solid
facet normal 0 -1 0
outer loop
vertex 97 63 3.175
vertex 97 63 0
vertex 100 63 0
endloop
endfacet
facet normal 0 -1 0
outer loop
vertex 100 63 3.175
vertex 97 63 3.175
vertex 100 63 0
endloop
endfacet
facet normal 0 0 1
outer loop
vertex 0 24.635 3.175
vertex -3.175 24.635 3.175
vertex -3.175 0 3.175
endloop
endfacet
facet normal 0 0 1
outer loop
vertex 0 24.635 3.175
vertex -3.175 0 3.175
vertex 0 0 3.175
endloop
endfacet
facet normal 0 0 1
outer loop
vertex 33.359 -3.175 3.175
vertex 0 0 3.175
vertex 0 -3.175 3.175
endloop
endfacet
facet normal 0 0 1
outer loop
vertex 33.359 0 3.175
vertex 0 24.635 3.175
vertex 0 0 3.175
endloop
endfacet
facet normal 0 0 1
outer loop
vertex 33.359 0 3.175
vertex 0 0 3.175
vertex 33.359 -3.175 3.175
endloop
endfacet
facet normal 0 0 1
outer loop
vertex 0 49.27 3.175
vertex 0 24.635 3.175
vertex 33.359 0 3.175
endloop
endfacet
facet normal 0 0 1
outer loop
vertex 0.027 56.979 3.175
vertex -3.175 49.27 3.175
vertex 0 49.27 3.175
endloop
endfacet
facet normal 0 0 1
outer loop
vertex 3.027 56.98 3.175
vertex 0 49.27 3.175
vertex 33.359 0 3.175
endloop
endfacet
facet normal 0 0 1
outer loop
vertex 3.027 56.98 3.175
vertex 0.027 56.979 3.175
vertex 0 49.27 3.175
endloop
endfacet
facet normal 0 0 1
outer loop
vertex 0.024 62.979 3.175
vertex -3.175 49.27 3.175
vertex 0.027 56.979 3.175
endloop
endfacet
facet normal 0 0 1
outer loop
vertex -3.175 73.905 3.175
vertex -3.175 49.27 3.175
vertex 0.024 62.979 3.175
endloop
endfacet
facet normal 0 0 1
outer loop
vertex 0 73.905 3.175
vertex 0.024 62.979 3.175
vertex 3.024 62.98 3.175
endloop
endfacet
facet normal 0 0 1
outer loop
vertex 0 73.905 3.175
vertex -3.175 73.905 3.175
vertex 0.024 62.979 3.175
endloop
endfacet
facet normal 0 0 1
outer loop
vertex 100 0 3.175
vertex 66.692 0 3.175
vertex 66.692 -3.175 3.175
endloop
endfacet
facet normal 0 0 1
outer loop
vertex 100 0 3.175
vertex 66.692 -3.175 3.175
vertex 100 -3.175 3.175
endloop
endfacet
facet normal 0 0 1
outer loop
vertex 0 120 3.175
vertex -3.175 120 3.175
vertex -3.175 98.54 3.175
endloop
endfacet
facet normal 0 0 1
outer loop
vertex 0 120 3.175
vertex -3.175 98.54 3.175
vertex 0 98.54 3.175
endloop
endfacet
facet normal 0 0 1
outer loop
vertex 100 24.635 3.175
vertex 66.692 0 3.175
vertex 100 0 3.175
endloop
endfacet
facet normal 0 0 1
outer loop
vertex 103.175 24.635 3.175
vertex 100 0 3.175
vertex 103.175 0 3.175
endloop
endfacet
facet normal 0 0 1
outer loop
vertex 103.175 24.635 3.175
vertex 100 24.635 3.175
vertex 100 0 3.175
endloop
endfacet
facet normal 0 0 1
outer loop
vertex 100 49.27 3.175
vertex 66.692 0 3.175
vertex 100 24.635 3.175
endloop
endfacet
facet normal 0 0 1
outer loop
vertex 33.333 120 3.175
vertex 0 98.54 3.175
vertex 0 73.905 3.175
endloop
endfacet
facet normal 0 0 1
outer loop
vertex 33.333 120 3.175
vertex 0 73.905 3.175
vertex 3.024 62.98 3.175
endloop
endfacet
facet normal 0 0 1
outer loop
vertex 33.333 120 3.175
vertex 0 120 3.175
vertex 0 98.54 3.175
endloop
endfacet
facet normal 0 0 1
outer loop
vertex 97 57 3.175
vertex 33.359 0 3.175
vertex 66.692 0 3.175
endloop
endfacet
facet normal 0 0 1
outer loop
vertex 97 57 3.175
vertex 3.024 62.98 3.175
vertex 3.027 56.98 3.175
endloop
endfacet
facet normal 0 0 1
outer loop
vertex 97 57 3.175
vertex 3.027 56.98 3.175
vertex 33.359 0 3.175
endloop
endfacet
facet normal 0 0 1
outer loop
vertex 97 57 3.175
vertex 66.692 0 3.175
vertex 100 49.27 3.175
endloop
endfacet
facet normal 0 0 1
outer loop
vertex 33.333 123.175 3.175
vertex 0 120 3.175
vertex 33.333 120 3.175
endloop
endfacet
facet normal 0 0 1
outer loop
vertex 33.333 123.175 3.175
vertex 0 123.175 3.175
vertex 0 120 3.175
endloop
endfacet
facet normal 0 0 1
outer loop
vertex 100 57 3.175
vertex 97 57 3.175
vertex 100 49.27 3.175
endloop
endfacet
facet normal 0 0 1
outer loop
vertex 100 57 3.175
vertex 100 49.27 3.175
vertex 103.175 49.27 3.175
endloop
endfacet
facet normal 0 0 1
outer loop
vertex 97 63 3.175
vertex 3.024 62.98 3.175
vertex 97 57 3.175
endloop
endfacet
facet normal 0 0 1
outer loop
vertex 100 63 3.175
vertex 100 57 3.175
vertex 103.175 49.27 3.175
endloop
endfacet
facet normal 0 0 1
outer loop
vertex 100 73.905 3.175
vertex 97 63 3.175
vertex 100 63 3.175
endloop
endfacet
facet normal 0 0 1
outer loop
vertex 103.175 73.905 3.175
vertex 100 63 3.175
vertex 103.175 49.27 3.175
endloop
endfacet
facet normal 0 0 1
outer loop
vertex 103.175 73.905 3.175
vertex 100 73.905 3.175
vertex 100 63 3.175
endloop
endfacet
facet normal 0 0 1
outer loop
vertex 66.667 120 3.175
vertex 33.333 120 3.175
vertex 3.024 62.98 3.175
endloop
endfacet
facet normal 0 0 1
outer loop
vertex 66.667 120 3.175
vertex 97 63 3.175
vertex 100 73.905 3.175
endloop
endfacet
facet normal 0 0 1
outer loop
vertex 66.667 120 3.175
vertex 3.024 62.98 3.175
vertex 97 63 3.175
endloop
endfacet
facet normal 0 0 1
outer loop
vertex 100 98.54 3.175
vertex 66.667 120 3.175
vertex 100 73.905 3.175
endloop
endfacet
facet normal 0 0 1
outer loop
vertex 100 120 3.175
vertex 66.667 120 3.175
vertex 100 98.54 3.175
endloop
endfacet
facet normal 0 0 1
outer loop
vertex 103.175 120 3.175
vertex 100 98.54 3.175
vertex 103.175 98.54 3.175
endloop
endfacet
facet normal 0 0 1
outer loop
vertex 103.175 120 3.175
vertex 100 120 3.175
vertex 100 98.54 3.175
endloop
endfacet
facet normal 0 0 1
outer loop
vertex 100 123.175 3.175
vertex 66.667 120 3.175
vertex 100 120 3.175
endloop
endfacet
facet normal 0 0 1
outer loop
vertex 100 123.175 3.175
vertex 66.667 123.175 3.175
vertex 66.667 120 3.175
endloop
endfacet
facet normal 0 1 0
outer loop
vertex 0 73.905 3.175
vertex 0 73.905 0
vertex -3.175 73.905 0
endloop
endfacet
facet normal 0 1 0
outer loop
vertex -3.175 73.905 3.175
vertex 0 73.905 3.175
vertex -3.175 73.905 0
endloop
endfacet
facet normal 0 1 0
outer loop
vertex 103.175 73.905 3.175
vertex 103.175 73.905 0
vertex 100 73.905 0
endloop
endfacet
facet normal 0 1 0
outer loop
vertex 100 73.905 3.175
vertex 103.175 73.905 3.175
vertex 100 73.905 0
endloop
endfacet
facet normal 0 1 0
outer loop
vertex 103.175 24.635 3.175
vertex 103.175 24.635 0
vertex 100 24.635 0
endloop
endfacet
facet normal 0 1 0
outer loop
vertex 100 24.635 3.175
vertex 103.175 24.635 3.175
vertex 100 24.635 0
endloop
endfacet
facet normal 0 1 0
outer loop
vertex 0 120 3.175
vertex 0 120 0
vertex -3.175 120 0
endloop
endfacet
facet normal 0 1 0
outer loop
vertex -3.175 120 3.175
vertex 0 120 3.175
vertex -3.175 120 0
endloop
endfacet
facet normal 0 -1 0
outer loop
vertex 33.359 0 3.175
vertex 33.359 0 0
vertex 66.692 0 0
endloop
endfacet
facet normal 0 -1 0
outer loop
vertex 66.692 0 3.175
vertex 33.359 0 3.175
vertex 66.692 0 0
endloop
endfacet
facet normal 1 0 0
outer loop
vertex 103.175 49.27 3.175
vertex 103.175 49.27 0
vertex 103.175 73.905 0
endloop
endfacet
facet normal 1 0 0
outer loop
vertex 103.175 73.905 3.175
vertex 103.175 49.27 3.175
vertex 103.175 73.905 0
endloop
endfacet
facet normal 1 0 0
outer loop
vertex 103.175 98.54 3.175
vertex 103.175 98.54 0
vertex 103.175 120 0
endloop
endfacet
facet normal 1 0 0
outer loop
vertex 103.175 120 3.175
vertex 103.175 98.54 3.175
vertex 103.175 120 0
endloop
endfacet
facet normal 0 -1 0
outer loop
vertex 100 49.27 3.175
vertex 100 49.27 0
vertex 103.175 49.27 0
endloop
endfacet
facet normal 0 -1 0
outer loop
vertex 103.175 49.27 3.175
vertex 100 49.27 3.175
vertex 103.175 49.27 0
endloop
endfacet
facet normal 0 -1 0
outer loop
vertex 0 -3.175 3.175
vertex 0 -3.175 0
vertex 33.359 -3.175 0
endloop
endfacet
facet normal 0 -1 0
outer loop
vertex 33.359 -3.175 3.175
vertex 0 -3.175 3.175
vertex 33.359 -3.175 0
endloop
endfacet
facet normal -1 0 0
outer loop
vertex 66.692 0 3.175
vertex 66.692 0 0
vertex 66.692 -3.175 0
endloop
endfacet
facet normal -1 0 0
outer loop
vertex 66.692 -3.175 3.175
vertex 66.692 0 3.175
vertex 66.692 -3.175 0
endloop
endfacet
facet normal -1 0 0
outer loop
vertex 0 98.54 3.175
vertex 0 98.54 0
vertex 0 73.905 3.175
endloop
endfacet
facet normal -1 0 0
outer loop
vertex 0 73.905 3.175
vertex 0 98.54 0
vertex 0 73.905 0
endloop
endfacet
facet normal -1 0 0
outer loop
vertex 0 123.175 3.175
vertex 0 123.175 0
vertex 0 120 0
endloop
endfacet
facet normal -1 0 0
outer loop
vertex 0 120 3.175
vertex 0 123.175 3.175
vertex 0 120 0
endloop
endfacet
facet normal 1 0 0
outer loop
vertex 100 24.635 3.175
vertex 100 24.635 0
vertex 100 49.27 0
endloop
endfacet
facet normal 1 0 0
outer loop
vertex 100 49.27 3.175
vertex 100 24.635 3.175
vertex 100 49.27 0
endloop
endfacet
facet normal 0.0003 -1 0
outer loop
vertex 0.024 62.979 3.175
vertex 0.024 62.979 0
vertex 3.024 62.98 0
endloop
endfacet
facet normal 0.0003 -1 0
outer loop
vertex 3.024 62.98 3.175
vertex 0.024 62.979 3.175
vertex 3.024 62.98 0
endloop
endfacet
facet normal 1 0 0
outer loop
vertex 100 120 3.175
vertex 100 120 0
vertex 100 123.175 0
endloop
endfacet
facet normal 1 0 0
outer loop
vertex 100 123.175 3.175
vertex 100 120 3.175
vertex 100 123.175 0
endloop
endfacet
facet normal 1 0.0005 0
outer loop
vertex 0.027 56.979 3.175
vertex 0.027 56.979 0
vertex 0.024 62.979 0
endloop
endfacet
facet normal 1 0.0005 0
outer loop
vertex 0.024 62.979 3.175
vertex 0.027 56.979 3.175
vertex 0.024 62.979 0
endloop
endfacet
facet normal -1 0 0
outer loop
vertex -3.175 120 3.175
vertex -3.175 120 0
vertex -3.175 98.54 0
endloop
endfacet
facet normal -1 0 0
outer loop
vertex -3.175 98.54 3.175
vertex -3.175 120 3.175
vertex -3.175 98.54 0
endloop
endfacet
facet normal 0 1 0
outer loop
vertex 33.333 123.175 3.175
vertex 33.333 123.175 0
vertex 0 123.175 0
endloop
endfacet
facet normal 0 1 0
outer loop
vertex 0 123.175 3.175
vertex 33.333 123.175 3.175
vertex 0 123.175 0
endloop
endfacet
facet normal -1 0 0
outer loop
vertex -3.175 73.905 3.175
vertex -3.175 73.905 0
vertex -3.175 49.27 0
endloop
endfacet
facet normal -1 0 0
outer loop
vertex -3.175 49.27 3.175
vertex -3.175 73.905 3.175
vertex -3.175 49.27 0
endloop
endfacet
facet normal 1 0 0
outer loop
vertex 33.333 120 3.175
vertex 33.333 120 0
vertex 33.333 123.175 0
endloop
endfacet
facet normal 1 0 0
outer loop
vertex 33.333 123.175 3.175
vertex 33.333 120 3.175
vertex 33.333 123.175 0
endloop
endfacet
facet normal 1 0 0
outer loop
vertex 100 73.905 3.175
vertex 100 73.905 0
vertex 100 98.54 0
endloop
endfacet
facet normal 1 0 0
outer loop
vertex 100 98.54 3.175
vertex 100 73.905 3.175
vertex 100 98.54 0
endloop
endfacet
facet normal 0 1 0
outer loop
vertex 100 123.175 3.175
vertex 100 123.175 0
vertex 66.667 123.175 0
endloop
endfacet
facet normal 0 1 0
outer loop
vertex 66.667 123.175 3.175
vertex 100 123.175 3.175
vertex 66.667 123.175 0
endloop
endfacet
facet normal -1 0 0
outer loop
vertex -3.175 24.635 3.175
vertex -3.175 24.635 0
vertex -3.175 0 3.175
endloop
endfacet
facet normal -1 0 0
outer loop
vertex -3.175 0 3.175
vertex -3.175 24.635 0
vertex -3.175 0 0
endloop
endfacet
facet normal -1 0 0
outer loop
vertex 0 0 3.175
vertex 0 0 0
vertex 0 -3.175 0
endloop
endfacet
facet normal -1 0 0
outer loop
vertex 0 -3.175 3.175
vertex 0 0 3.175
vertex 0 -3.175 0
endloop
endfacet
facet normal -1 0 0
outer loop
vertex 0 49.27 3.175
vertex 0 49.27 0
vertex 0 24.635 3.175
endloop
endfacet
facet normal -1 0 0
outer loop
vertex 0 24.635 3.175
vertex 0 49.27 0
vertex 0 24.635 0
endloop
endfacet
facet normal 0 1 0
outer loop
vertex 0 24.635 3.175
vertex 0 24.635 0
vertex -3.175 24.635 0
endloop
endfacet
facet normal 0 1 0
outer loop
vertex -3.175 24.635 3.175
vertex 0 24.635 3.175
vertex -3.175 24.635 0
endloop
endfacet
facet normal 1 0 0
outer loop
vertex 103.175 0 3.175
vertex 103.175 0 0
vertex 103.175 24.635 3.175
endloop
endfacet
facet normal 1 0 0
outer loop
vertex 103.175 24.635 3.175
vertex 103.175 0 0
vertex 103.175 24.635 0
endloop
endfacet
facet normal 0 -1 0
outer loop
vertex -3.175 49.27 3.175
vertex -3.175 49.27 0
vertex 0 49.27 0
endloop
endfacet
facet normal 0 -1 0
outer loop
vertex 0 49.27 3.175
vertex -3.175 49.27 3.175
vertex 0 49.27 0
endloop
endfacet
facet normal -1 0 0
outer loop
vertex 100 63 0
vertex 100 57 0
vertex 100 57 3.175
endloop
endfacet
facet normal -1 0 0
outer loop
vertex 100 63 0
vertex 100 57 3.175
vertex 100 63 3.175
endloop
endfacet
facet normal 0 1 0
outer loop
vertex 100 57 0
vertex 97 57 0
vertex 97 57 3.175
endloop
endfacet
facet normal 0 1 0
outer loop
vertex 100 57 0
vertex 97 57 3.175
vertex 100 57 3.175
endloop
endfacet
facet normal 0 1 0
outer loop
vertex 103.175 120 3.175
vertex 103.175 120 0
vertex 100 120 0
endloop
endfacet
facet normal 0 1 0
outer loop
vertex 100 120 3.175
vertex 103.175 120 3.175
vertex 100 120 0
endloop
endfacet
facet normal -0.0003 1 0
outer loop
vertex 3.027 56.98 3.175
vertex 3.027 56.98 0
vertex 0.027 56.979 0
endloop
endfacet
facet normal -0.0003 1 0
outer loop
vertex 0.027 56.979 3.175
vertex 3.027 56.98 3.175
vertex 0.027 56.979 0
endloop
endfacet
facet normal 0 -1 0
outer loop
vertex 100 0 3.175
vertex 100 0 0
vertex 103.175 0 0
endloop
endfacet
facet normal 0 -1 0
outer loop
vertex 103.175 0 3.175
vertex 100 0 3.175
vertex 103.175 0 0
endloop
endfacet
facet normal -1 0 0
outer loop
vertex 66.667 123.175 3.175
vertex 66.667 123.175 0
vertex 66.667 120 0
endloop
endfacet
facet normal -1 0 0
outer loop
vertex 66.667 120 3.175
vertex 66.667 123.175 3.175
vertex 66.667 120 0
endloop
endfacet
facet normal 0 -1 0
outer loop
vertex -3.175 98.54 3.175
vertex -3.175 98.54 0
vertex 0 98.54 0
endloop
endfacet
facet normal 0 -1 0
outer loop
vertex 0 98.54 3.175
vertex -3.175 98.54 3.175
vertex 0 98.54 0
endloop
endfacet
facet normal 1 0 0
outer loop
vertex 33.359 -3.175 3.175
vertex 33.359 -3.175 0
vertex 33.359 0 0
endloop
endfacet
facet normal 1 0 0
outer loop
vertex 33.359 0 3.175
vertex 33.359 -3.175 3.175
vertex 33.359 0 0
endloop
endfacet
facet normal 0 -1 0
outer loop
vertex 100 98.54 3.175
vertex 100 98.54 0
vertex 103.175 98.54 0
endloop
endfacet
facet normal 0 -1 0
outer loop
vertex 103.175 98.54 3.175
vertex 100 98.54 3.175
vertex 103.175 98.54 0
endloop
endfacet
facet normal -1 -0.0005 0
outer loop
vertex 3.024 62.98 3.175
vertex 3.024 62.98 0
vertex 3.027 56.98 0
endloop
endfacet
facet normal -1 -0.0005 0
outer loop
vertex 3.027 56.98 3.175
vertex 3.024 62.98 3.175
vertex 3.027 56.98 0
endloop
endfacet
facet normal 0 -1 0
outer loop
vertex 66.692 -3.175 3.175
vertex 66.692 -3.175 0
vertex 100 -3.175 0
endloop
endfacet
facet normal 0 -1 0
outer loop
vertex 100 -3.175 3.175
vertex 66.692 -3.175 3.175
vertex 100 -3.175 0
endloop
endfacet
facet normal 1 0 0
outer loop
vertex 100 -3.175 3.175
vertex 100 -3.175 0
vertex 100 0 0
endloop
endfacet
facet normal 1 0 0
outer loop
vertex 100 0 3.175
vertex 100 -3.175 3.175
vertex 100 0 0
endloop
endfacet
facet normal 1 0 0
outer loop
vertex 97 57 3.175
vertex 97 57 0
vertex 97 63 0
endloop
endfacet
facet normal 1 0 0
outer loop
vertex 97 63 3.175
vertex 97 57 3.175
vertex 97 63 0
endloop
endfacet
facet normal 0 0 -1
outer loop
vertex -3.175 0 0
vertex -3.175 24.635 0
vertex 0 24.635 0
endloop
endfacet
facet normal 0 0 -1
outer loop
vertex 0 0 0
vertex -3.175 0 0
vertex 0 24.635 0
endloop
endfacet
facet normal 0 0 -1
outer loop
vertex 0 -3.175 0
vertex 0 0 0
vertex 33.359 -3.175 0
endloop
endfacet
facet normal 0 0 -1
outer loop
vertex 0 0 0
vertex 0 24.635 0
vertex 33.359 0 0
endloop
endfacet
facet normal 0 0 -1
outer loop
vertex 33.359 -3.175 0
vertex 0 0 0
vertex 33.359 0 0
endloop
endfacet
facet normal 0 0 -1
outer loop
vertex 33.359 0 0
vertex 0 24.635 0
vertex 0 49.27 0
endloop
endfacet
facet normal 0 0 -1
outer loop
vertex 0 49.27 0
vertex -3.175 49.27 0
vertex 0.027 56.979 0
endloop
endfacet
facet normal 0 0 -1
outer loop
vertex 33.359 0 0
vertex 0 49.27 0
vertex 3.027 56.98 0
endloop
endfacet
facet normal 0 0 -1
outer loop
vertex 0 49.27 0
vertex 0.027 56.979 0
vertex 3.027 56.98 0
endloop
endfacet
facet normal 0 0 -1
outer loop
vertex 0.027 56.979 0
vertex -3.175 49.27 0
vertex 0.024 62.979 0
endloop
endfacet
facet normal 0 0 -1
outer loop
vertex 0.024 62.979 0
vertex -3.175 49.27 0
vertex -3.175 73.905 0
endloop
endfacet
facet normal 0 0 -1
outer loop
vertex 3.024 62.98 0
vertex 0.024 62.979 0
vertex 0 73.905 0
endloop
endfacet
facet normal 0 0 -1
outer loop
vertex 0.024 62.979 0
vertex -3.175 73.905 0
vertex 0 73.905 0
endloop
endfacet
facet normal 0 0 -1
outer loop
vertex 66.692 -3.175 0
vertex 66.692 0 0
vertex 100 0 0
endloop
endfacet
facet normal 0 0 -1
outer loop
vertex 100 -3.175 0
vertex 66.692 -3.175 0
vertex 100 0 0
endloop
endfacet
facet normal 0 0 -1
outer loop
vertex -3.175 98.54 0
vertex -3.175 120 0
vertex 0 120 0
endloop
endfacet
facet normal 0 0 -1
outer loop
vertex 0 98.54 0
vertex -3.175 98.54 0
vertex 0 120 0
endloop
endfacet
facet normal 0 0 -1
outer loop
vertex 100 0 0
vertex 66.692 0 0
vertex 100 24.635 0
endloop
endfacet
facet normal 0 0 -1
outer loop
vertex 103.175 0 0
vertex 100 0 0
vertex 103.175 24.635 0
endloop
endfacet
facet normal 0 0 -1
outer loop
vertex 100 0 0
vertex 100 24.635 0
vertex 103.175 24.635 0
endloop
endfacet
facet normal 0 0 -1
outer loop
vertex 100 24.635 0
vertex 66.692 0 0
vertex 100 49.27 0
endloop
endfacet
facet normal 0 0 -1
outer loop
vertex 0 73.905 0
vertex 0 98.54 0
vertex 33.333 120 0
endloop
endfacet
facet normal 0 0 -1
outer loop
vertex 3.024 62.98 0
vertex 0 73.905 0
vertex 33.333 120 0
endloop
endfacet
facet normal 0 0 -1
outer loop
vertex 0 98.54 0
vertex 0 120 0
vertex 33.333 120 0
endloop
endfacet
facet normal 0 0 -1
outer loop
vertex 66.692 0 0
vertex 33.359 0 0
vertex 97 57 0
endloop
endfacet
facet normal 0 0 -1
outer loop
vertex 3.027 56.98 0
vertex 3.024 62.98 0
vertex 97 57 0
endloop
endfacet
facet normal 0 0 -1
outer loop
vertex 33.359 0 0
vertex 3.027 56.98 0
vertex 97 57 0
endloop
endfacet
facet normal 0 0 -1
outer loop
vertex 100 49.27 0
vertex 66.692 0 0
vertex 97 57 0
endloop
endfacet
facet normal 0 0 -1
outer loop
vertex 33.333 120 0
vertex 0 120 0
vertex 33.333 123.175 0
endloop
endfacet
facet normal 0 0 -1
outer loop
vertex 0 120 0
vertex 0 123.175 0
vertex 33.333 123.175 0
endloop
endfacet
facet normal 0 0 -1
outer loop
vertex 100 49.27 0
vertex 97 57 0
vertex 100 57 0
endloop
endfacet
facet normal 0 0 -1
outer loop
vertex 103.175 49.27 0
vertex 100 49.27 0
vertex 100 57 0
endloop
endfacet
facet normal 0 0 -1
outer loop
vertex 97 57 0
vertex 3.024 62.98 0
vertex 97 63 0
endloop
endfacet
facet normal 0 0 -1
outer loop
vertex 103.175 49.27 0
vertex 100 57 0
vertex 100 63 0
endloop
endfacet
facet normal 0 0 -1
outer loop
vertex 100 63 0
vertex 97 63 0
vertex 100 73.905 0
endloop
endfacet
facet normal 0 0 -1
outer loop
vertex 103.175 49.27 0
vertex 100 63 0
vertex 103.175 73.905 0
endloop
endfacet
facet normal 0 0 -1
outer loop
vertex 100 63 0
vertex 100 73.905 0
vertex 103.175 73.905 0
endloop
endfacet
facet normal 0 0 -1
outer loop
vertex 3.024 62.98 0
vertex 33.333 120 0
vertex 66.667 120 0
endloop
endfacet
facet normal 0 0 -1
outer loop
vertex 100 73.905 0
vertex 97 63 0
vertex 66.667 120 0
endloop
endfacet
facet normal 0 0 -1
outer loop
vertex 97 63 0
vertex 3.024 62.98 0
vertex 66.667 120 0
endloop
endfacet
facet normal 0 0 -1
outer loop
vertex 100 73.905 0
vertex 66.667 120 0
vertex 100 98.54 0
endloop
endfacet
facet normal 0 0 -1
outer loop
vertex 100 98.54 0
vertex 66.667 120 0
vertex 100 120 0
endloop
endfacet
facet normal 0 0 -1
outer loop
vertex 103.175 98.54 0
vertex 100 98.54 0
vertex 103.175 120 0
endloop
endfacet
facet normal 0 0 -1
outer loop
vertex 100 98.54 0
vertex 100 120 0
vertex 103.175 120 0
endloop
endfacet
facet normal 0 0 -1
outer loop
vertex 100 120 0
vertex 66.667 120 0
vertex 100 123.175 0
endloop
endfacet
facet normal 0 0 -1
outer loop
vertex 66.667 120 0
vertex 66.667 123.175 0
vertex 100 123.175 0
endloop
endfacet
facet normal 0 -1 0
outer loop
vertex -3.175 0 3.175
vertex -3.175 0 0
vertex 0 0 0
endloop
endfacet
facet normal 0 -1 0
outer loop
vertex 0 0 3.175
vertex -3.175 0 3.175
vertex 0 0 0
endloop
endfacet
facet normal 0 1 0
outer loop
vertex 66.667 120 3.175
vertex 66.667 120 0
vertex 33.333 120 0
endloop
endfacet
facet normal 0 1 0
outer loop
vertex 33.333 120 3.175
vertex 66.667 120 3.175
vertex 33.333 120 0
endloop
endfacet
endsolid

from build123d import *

# Parameters (mm, degrees)
SKETCH1_W           = 3
SKETCH1_H           = 6
BOSS_EXTRUDE1_DEPTH = 3.175


with BuildPart() as part:
    # Sketch1 → Boss-Extrude1 (new body)
    with BuildSketch(Plane.XY):
        Polygon((0, 120), (-3.175, 120), (-3.175, 98.54), (0, 98.54), (0, 73.905), (-3.175, 73.905), (-3.175, 49.27), (0, 49.27), (0, 24.635), (-3.175, 24.635), (-3.175, 0), (0, 0), (0, -3.175), (33.358811077, -3.175), (33.358811077, 0), (66.692144411, 0), (66.692144411, -3.175), (100, -3.175), (100, 0), (103.175, 0), (103.175, 24.635), (100, 24.635), (100, 49.27), (103.175, 49.27), (103.175, 73.905), (100, 73.905), (100, 98.54), (103.175, 98.54), (103.175, 120), (100, 120), (100, 123.175), (66.666666667, 123.175), (66.666666667, 120), (33.333333333, 120), (33.333333333, 123.175), (0, 123.175), align=None)
        with Locations((98.5, 60)):
            Rectangle(SKETCH1_W, SKETCH1_H, mode=Mode.SUBTRACT)
        Polygon((3.024208093, 62.980047574), (3.026755867, 56.980048114), (0.026756138, 56.978774227), (0.024208364, 62.978773686), align=None, mode=Mode.SUBTRACT)
    extrude(amount=BOSS_EXTRUDE1_DEPTH)


solid = part.part
